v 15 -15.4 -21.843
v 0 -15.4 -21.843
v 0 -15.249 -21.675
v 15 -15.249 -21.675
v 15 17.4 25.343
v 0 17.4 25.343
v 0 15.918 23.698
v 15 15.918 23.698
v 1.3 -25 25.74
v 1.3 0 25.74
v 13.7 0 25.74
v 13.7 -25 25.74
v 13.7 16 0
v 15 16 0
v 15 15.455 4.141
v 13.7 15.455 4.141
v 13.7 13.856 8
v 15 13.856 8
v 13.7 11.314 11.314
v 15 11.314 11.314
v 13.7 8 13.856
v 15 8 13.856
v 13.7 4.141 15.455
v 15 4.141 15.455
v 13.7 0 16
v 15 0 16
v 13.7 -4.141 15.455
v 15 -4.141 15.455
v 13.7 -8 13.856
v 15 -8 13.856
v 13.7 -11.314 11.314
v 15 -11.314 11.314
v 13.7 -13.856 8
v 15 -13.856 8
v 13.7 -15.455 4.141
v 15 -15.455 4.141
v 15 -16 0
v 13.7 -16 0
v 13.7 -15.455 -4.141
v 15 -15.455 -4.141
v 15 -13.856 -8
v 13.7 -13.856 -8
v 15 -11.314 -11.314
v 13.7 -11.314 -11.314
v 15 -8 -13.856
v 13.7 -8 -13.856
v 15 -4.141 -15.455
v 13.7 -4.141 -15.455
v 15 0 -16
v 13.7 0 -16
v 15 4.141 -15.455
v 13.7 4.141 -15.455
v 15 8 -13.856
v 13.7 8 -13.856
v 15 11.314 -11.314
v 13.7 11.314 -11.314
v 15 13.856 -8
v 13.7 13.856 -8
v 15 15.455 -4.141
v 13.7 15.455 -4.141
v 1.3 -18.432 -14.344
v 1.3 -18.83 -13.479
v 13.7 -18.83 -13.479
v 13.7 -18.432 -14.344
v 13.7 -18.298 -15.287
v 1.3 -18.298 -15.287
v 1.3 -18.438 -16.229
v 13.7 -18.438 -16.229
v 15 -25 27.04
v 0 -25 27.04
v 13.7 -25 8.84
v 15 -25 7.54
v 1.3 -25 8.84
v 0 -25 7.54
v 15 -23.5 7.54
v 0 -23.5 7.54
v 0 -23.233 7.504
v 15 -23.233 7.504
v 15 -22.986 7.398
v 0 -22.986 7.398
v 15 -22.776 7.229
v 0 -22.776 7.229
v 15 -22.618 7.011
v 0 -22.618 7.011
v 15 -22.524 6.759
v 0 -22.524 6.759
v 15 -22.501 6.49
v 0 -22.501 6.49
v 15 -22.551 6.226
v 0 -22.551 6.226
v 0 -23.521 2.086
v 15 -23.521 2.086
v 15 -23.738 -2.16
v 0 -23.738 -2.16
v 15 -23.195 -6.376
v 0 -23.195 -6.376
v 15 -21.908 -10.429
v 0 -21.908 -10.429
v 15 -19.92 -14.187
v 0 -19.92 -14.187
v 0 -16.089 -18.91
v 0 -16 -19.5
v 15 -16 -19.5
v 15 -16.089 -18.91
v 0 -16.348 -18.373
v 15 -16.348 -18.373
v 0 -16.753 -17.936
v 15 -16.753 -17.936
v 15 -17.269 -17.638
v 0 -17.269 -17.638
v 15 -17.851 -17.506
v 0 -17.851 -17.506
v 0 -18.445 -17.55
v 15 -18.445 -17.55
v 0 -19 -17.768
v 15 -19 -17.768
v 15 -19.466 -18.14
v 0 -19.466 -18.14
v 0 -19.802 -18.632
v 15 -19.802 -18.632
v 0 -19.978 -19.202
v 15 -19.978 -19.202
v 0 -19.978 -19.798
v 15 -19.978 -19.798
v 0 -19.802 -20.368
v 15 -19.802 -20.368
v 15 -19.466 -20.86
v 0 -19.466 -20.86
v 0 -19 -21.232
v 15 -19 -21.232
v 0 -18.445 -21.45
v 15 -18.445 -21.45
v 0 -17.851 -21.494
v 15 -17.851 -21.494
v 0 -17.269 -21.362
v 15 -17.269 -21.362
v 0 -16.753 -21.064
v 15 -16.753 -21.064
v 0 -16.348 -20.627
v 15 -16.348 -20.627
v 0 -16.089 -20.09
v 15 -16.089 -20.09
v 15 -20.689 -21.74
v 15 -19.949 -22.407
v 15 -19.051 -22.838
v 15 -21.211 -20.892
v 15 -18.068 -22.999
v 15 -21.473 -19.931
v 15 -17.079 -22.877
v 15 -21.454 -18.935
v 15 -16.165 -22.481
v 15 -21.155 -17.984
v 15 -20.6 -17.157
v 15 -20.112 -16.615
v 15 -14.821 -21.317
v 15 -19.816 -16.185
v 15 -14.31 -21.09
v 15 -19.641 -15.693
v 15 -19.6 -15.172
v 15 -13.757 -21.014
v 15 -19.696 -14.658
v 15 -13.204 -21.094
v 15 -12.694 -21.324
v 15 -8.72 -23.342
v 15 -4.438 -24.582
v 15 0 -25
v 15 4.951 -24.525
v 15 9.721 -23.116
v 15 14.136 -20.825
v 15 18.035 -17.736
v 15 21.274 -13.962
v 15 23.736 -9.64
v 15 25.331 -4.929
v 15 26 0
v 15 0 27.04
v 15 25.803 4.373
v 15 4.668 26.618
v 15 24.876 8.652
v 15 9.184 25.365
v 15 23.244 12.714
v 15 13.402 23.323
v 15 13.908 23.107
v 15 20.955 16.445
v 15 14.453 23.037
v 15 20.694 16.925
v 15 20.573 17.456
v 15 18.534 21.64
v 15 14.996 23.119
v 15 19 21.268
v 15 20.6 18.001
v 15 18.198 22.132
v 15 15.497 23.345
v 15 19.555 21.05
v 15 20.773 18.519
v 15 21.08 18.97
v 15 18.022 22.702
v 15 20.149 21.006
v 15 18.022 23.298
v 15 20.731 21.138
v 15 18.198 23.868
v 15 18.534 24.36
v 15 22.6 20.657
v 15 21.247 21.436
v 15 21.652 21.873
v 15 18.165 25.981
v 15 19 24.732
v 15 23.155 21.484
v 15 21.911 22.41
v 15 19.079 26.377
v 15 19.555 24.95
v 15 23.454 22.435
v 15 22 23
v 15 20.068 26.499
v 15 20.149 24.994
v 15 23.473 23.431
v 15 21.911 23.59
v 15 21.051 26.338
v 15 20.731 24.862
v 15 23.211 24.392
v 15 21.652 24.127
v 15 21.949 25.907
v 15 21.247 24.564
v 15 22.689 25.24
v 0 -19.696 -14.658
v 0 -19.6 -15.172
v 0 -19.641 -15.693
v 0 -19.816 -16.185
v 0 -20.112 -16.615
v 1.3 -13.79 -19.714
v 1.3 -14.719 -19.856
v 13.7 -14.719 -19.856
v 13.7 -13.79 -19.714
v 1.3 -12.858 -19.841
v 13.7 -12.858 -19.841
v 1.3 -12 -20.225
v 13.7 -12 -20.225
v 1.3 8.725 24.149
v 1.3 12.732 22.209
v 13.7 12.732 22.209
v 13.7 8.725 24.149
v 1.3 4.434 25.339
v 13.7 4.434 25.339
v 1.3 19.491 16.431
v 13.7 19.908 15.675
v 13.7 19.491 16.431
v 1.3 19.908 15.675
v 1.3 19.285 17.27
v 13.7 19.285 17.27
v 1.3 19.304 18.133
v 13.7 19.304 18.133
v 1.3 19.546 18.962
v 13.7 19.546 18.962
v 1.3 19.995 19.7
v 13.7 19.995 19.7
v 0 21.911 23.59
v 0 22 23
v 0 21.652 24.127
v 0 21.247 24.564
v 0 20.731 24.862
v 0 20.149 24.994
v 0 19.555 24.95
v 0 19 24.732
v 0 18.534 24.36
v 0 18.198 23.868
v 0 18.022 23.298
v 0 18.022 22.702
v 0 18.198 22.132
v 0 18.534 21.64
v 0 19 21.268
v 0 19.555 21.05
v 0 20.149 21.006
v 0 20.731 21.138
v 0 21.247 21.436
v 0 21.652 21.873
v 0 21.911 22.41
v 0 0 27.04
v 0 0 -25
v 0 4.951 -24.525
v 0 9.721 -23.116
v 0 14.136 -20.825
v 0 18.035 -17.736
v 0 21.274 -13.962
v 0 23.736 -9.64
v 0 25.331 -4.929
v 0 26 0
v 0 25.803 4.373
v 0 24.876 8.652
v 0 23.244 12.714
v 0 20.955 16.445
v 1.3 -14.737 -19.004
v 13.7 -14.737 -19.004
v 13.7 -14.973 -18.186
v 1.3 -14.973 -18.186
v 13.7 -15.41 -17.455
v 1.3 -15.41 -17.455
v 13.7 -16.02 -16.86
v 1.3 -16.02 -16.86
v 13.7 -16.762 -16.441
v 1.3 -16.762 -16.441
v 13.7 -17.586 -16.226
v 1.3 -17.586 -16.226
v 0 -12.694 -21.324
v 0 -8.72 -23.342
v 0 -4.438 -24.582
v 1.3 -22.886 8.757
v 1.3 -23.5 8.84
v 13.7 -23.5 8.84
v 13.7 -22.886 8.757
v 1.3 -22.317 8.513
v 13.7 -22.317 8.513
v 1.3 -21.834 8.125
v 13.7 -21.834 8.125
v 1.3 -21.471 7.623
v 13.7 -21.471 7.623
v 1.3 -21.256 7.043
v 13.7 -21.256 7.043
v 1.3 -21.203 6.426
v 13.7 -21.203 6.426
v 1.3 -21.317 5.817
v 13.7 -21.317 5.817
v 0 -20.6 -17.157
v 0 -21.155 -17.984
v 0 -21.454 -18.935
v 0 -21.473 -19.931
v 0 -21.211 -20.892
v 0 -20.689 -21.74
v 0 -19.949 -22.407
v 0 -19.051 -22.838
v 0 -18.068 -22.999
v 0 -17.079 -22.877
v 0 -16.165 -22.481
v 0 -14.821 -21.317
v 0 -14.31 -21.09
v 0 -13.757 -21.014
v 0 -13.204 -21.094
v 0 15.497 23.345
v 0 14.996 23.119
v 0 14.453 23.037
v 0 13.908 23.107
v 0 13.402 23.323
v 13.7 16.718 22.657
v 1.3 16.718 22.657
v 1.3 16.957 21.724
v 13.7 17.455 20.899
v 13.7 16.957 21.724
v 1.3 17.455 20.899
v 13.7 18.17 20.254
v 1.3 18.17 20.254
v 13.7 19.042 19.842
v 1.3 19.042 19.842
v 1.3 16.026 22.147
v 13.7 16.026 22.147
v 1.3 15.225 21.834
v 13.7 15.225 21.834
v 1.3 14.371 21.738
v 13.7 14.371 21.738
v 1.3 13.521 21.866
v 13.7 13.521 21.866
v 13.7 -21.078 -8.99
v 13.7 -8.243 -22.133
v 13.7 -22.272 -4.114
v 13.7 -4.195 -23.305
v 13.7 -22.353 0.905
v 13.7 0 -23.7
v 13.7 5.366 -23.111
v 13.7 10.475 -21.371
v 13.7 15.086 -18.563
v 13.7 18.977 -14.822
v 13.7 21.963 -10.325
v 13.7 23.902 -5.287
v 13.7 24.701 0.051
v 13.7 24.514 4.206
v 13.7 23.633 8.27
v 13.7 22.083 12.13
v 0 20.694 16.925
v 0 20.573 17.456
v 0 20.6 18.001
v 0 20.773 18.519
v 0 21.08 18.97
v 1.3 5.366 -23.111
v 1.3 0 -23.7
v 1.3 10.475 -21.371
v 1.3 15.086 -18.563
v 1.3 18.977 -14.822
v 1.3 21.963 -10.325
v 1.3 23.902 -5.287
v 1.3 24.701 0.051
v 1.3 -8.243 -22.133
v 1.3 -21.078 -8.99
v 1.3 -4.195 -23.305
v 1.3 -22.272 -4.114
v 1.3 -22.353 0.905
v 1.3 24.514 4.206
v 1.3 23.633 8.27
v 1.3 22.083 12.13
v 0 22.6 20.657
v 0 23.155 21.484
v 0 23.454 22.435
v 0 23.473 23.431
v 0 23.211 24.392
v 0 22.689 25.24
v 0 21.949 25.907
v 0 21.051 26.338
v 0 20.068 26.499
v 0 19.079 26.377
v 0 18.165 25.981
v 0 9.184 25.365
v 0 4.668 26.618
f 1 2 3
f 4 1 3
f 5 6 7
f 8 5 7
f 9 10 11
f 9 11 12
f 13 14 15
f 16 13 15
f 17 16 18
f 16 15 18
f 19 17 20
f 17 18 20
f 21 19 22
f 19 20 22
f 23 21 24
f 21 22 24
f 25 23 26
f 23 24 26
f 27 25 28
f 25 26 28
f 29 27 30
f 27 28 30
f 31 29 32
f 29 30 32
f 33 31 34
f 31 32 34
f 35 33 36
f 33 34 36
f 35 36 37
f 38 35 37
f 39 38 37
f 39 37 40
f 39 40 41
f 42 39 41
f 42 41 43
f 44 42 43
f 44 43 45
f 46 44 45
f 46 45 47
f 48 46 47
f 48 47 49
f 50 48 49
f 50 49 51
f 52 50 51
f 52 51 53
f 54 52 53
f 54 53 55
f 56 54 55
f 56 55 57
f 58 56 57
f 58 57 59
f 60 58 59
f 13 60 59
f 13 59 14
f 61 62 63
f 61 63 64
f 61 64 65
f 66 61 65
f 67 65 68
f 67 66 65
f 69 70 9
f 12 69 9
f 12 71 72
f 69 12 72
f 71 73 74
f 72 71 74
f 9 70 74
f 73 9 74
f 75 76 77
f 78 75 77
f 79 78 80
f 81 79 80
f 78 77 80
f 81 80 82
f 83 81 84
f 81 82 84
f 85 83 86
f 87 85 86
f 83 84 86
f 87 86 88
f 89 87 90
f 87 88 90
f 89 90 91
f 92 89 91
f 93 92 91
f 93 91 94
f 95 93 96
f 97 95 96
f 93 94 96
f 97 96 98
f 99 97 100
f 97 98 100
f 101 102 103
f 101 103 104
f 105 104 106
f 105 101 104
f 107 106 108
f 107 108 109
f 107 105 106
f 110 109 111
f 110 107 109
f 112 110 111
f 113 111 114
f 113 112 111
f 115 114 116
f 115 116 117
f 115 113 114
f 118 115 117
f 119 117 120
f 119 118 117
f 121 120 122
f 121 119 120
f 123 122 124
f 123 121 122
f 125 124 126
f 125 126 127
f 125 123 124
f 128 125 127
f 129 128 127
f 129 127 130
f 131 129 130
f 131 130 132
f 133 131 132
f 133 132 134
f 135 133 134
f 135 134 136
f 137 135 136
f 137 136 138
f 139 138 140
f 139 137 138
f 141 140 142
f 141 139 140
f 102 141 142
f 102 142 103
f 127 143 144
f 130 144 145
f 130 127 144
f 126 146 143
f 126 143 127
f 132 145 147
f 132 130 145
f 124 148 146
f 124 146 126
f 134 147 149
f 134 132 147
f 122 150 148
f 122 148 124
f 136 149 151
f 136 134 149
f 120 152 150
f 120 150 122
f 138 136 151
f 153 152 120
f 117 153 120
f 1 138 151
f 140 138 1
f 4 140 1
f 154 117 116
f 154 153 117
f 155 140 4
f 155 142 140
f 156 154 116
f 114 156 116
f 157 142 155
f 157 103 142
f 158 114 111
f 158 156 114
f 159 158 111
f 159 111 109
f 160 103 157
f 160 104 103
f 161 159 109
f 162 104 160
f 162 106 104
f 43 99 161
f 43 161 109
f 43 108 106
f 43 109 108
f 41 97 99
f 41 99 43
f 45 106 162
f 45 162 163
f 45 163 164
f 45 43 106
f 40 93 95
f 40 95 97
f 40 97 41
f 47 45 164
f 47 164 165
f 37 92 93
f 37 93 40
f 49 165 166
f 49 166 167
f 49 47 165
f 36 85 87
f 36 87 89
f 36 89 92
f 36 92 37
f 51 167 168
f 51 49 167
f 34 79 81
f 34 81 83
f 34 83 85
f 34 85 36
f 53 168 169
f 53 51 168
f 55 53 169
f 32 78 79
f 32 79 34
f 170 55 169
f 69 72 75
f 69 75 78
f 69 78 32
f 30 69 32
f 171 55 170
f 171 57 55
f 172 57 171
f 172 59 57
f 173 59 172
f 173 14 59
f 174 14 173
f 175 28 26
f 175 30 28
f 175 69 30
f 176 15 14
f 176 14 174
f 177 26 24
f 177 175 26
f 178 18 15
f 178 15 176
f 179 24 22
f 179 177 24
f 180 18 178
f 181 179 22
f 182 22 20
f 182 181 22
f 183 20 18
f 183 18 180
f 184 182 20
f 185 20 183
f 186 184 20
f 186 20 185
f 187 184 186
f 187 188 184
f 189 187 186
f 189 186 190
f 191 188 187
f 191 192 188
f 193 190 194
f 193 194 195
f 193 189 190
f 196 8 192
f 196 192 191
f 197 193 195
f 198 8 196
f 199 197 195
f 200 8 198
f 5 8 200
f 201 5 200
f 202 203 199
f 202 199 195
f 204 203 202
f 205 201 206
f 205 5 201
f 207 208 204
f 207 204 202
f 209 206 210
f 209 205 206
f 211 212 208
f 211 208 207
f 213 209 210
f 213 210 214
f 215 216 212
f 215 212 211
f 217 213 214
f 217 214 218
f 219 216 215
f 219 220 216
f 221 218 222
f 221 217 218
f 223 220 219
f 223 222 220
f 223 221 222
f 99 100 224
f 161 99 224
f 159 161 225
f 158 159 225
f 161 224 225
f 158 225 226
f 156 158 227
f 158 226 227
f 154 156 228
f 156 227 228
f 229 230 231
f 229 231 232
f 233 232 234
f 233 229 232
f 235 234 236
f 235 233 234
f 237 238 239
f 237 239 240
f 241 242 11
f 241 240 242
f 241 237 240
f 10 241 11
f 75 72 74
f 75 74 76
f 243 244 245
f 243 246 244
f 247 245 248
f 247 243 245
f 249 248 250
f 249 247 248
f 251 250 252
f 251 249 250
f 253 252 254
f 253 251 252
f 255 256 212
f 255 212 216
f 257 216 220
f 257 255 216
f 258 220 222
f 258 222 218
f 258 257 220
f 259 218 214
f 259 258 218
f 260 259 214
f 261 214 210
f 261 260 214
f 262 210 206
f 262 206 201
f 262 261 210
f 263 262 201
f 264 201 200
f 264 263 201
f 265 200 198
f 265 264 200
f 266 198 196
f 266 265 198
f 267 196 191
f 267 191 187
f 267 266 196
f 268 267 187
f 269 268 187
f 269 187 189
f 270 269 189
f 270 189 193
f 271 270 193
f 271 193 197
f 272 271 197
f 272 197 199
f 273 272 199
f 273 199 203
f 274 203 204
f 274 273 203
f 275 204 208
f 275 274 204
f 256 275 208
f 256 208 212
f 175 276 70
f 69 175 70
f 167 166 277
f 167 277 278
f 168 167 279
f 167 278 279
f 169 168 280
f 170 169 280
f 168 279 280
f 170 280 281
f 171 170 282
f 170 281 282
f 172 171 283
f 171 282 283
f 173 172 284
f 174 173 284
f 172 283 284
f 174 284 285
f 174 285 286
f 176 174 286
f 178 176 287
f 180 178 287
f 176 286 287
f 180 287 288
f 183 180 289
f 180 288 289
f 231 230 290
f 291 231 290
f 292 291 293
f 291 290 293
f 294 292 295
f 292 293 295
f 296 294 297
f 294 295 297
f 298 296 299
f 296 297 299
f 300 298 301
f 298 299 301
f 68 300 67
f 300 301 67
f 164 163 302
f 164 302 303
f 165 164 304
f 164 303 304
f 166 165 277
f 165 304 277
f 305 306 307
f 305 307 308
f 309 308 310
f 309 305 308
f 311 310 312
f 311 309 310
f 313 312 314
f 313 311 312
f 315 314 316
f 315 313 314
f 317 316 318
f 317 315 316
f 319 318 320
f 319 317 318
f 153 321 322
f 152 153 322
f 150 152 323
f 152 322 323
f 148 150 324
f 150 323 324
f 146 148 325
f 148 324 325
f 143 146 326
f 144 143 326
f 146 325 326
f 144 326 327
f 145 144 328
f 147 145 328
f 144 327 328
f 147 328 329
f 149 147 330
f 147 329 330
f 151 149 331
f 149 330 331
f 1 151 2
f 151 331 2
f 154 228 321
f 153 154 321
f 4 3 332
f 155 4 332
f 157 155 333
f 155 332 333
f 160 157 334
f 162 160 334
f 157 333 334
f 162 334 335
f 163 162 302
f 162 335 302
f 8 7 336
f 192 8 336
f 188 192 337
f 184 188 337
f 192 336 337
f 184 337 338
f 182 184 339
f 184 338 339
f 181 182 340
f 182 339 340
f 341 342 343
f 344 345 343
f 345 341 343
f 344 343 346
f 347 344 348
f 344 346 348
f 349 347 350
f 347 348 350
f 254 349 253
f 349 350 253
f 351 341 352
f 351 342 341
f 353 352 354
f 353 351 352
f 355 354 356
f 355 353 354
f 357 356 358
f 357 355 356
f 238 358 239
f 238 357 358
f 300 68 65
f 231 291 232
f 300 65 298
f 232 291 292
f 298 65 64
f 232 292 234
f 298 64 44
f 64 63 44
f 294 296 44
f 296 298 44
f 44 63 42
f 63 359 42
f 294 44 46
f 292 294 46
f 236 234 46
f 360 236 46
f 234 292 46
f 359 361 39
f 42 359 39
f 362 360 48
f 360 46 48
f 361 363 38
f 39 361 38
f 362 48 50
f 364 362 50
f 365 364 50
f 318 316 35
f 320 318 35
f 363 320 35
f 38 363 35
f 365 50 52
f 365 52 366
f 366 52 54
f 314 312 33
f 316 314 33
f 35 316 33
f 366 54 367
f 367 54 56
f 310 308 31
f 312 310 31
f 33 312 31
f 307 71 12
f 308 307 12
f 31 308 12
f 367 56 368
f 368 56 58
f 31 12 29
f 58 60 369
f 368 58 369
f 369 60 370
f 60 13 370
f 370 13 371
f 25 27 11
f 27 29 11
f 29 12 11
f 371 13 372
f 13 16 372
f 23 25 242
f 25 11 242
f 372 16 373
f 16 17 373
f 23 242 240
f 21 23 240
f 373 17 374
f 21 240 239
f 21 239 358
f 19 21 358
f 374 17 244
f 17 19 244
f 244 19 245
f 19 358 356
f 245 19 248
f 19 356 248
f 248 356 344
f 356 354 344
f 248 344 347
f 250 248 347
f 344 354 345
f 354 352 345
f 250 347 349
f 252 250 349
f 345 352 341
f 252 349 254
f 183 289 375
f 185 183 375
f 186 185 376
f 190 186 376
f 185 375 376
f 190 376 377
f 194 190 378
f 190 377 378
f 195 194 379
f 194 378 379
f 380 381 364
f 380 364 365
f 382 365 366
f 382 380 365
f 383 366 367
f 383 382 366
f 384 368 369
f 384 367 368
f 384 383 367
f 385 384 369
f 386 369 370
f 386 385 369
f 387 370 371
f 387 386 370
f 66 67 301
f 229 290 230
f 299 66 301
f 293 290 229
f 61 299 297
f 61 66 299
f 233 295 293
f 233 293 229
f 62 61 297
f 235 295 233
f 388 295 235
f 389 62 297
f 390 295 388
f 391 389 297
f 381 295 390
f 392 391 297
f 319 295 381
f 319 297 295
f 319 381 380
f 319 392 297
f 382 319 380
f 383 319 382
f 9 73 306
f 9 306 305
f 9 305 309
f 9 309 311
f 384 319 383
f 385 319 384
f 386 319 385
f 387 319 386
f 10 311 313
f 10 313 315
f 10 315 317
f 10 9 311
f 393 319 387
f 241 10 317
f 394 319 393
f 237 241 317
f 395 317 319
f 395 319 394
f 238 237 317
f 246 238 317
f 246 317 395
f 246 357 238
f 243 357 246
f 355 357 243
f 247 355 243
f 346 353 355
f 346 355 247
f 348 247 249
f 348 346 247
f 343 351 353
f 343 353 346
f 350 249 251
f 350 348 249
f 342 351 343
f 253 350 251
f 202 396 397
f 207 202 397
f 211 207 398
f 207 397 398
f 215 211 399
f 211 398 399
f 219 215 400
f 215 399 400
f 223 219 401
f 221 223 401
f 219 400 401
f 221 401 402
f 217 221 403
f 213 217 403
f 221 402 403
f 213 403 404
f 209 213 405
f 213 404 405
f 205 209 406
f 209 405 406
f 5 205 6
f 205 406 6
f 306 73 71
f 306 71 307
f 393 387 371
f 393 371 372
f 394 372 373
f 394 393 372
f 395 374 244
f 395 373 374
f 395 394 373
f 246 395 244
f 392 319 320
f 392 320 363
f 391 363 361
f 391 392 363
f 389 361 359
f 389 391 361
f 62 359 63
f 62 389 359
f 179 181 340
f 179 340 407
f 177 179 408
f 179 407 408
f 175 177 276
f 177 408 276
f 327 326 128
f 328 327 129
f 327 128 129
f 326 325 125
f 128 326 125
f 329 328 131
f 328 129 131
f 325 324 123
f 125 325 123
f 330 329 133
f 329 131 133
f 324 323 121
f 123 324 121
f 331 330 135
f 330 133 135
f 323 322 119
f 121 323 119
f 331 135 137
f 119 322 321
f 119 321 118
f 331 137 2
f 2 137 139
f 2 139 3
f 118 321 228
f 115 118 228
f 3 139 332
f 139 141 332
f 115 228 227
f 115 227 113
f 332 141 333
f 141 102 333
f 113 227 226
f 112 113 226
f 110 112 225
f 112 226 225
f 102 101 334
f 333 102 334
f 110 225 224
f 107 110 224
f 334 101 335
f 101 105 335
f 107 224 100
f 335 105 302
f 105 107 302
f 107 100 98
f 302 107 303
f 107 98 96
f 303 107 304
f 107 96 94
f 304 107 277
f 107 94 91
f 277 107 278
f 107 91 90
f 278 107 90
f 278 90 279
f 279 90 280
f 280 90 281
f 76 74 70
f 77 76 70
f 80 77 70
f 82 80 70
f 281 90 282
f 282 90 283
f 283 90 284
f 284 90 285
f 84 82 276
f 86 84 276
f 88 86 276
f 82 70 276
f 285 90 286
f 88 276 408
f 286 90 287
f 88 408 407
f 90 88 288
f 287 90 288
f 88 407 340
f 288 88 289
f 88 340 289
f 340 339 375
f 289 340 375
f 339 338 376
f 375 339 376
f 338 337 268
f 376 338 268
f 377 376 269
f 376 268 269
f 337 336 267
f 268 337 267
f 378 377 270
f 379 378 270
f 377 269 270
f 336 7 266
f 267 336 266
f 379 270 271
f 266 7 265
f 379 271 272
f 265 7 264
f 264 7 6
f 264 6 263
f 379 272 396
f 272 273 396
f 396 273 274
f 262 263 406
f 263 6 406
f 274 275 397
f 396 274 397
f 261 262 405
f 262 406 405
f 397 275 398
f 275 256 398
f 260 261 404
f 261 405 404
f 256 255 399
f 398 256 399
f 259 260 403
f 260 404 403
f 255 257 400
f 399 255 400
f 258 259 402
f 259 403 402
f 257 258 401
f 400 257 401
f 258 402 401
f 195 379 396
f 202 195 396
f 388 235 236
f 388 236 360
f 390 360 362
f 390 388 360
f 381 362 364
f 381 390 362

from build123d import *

# Parameters (mm, degrees)
F0_R     = 2
F0_R_2   = 16
F0_R_3   = 12
F1_DEPTH = 15
F2_T     = -1.3
F3_R     = 16
F4_DEPTH = 13.7


with BuildPart() as f1:
    # F0 (on Right) → F1 (new body)
    with BuildSketch(Plane.YZ):
        with BuildLine():
            Line((0, 27.04), (-25, 27.04))
            Line((-25, 27.04), (-25, 7.54))
            Line((-25, 7.54), (-23.5, 7.54))
            ThreePointArc((-23.5, 7.54), (-22.6893076327, 7.1254723611), (-22.5507240512, 6.2255557713))
            ThreePointArc((-22.5507240512, 6.2255557713), (-23.560917154, -4.2802307332), (-19.9204959385, -14.1867625963))
            ThreePointArc((-19.9204959385, -14.1867625963), (-19.6037904967, -15.4335268949), (-20.1118893252, -16.6152879255))
            Line((-20.1118893252, -16.6152879255), (-20.6000079963, -17.1569339704))
            ThreePointArc((-20.6000079963, -17.1569339704), (-20.3430660296, -22.1000079963), (-15.3999920037, -21.8430660296))
            Line((-15.3999920037, -21.8430660296), (-15.2488749918, -21.6753774394))
            ThreePointArc((-15.2488749918, -21.6753774394), (-14.0358697185, -21.0329527273), (-12.6944101233, -21.3237747657))
            ThreePointArc((-12.6944101233, -21.3237747657), (-6.6080004607, -24.0624425834), (0, -25))
            ThreePointArc((0, -25), (18.0346887969, -17.7360763487), (26, 0))
            ThreePointArc((26, 0), (24.8756586881, 8.6516449625), (20.9547141799, 16.4453153497))
            ThreePointArc((20.9547141799, 16.4453153497), (20.5678212068, 17.7298278052), (21.0796574448, 18.969860904))
            Line((21.0796574448, 18.969860904), (22.6000079963, 20.6569339704))
            ThreePointArc((22.6000079963, 20.6569339704), (22.3430660296, 25.6000079963), (17.3999920037, 25.3430660296))
            Line((17.3999920037, 25.3430660296), (15.9178980328, 23.6984447825))
            ThreePointArc((15.9178980328, 23.6984447825), (14.7273428061, 23.0592399542), (13.4020450466, 23.3230398953))
            ThreePointArc((13.4020450466, 23.3230398953), (6.9539665632, 26.0935467981), (0, 27.04))
        make_face()
        with Locations((-18, -19.5)):
            Circle(F0_R, mode=Mode.SUBTRACT)
        Circle(F0_R_2, mode=Mode.SUBTRACT)
        with Locations((20, 23)):
            Circle(F0_R, mode=Mode.SUBTRACT)
        Circle(F0_R_2)
        Circle(F0_R_3, mode=Mode.SUBTRACT)
        Circle(F0_R_3)
    extrude(amount=F1_DEPTH)

    # F2
    f2_openings = [f1.faces().sort_by_distance(p)[0] for p in [
        (7.5, -25, 17.29),
    ]]
    offset(amount=F2_T, openings=f2_openings)

    # F3 (on face) → F4 (cut, through all)
    with BuildSketch(Plane.YZ.offset(15)):
        Circle(F3_R)
    extrude(amount=-F4_DEPTH, mode=Mode.SUBTRACT)


solid = f1.part
